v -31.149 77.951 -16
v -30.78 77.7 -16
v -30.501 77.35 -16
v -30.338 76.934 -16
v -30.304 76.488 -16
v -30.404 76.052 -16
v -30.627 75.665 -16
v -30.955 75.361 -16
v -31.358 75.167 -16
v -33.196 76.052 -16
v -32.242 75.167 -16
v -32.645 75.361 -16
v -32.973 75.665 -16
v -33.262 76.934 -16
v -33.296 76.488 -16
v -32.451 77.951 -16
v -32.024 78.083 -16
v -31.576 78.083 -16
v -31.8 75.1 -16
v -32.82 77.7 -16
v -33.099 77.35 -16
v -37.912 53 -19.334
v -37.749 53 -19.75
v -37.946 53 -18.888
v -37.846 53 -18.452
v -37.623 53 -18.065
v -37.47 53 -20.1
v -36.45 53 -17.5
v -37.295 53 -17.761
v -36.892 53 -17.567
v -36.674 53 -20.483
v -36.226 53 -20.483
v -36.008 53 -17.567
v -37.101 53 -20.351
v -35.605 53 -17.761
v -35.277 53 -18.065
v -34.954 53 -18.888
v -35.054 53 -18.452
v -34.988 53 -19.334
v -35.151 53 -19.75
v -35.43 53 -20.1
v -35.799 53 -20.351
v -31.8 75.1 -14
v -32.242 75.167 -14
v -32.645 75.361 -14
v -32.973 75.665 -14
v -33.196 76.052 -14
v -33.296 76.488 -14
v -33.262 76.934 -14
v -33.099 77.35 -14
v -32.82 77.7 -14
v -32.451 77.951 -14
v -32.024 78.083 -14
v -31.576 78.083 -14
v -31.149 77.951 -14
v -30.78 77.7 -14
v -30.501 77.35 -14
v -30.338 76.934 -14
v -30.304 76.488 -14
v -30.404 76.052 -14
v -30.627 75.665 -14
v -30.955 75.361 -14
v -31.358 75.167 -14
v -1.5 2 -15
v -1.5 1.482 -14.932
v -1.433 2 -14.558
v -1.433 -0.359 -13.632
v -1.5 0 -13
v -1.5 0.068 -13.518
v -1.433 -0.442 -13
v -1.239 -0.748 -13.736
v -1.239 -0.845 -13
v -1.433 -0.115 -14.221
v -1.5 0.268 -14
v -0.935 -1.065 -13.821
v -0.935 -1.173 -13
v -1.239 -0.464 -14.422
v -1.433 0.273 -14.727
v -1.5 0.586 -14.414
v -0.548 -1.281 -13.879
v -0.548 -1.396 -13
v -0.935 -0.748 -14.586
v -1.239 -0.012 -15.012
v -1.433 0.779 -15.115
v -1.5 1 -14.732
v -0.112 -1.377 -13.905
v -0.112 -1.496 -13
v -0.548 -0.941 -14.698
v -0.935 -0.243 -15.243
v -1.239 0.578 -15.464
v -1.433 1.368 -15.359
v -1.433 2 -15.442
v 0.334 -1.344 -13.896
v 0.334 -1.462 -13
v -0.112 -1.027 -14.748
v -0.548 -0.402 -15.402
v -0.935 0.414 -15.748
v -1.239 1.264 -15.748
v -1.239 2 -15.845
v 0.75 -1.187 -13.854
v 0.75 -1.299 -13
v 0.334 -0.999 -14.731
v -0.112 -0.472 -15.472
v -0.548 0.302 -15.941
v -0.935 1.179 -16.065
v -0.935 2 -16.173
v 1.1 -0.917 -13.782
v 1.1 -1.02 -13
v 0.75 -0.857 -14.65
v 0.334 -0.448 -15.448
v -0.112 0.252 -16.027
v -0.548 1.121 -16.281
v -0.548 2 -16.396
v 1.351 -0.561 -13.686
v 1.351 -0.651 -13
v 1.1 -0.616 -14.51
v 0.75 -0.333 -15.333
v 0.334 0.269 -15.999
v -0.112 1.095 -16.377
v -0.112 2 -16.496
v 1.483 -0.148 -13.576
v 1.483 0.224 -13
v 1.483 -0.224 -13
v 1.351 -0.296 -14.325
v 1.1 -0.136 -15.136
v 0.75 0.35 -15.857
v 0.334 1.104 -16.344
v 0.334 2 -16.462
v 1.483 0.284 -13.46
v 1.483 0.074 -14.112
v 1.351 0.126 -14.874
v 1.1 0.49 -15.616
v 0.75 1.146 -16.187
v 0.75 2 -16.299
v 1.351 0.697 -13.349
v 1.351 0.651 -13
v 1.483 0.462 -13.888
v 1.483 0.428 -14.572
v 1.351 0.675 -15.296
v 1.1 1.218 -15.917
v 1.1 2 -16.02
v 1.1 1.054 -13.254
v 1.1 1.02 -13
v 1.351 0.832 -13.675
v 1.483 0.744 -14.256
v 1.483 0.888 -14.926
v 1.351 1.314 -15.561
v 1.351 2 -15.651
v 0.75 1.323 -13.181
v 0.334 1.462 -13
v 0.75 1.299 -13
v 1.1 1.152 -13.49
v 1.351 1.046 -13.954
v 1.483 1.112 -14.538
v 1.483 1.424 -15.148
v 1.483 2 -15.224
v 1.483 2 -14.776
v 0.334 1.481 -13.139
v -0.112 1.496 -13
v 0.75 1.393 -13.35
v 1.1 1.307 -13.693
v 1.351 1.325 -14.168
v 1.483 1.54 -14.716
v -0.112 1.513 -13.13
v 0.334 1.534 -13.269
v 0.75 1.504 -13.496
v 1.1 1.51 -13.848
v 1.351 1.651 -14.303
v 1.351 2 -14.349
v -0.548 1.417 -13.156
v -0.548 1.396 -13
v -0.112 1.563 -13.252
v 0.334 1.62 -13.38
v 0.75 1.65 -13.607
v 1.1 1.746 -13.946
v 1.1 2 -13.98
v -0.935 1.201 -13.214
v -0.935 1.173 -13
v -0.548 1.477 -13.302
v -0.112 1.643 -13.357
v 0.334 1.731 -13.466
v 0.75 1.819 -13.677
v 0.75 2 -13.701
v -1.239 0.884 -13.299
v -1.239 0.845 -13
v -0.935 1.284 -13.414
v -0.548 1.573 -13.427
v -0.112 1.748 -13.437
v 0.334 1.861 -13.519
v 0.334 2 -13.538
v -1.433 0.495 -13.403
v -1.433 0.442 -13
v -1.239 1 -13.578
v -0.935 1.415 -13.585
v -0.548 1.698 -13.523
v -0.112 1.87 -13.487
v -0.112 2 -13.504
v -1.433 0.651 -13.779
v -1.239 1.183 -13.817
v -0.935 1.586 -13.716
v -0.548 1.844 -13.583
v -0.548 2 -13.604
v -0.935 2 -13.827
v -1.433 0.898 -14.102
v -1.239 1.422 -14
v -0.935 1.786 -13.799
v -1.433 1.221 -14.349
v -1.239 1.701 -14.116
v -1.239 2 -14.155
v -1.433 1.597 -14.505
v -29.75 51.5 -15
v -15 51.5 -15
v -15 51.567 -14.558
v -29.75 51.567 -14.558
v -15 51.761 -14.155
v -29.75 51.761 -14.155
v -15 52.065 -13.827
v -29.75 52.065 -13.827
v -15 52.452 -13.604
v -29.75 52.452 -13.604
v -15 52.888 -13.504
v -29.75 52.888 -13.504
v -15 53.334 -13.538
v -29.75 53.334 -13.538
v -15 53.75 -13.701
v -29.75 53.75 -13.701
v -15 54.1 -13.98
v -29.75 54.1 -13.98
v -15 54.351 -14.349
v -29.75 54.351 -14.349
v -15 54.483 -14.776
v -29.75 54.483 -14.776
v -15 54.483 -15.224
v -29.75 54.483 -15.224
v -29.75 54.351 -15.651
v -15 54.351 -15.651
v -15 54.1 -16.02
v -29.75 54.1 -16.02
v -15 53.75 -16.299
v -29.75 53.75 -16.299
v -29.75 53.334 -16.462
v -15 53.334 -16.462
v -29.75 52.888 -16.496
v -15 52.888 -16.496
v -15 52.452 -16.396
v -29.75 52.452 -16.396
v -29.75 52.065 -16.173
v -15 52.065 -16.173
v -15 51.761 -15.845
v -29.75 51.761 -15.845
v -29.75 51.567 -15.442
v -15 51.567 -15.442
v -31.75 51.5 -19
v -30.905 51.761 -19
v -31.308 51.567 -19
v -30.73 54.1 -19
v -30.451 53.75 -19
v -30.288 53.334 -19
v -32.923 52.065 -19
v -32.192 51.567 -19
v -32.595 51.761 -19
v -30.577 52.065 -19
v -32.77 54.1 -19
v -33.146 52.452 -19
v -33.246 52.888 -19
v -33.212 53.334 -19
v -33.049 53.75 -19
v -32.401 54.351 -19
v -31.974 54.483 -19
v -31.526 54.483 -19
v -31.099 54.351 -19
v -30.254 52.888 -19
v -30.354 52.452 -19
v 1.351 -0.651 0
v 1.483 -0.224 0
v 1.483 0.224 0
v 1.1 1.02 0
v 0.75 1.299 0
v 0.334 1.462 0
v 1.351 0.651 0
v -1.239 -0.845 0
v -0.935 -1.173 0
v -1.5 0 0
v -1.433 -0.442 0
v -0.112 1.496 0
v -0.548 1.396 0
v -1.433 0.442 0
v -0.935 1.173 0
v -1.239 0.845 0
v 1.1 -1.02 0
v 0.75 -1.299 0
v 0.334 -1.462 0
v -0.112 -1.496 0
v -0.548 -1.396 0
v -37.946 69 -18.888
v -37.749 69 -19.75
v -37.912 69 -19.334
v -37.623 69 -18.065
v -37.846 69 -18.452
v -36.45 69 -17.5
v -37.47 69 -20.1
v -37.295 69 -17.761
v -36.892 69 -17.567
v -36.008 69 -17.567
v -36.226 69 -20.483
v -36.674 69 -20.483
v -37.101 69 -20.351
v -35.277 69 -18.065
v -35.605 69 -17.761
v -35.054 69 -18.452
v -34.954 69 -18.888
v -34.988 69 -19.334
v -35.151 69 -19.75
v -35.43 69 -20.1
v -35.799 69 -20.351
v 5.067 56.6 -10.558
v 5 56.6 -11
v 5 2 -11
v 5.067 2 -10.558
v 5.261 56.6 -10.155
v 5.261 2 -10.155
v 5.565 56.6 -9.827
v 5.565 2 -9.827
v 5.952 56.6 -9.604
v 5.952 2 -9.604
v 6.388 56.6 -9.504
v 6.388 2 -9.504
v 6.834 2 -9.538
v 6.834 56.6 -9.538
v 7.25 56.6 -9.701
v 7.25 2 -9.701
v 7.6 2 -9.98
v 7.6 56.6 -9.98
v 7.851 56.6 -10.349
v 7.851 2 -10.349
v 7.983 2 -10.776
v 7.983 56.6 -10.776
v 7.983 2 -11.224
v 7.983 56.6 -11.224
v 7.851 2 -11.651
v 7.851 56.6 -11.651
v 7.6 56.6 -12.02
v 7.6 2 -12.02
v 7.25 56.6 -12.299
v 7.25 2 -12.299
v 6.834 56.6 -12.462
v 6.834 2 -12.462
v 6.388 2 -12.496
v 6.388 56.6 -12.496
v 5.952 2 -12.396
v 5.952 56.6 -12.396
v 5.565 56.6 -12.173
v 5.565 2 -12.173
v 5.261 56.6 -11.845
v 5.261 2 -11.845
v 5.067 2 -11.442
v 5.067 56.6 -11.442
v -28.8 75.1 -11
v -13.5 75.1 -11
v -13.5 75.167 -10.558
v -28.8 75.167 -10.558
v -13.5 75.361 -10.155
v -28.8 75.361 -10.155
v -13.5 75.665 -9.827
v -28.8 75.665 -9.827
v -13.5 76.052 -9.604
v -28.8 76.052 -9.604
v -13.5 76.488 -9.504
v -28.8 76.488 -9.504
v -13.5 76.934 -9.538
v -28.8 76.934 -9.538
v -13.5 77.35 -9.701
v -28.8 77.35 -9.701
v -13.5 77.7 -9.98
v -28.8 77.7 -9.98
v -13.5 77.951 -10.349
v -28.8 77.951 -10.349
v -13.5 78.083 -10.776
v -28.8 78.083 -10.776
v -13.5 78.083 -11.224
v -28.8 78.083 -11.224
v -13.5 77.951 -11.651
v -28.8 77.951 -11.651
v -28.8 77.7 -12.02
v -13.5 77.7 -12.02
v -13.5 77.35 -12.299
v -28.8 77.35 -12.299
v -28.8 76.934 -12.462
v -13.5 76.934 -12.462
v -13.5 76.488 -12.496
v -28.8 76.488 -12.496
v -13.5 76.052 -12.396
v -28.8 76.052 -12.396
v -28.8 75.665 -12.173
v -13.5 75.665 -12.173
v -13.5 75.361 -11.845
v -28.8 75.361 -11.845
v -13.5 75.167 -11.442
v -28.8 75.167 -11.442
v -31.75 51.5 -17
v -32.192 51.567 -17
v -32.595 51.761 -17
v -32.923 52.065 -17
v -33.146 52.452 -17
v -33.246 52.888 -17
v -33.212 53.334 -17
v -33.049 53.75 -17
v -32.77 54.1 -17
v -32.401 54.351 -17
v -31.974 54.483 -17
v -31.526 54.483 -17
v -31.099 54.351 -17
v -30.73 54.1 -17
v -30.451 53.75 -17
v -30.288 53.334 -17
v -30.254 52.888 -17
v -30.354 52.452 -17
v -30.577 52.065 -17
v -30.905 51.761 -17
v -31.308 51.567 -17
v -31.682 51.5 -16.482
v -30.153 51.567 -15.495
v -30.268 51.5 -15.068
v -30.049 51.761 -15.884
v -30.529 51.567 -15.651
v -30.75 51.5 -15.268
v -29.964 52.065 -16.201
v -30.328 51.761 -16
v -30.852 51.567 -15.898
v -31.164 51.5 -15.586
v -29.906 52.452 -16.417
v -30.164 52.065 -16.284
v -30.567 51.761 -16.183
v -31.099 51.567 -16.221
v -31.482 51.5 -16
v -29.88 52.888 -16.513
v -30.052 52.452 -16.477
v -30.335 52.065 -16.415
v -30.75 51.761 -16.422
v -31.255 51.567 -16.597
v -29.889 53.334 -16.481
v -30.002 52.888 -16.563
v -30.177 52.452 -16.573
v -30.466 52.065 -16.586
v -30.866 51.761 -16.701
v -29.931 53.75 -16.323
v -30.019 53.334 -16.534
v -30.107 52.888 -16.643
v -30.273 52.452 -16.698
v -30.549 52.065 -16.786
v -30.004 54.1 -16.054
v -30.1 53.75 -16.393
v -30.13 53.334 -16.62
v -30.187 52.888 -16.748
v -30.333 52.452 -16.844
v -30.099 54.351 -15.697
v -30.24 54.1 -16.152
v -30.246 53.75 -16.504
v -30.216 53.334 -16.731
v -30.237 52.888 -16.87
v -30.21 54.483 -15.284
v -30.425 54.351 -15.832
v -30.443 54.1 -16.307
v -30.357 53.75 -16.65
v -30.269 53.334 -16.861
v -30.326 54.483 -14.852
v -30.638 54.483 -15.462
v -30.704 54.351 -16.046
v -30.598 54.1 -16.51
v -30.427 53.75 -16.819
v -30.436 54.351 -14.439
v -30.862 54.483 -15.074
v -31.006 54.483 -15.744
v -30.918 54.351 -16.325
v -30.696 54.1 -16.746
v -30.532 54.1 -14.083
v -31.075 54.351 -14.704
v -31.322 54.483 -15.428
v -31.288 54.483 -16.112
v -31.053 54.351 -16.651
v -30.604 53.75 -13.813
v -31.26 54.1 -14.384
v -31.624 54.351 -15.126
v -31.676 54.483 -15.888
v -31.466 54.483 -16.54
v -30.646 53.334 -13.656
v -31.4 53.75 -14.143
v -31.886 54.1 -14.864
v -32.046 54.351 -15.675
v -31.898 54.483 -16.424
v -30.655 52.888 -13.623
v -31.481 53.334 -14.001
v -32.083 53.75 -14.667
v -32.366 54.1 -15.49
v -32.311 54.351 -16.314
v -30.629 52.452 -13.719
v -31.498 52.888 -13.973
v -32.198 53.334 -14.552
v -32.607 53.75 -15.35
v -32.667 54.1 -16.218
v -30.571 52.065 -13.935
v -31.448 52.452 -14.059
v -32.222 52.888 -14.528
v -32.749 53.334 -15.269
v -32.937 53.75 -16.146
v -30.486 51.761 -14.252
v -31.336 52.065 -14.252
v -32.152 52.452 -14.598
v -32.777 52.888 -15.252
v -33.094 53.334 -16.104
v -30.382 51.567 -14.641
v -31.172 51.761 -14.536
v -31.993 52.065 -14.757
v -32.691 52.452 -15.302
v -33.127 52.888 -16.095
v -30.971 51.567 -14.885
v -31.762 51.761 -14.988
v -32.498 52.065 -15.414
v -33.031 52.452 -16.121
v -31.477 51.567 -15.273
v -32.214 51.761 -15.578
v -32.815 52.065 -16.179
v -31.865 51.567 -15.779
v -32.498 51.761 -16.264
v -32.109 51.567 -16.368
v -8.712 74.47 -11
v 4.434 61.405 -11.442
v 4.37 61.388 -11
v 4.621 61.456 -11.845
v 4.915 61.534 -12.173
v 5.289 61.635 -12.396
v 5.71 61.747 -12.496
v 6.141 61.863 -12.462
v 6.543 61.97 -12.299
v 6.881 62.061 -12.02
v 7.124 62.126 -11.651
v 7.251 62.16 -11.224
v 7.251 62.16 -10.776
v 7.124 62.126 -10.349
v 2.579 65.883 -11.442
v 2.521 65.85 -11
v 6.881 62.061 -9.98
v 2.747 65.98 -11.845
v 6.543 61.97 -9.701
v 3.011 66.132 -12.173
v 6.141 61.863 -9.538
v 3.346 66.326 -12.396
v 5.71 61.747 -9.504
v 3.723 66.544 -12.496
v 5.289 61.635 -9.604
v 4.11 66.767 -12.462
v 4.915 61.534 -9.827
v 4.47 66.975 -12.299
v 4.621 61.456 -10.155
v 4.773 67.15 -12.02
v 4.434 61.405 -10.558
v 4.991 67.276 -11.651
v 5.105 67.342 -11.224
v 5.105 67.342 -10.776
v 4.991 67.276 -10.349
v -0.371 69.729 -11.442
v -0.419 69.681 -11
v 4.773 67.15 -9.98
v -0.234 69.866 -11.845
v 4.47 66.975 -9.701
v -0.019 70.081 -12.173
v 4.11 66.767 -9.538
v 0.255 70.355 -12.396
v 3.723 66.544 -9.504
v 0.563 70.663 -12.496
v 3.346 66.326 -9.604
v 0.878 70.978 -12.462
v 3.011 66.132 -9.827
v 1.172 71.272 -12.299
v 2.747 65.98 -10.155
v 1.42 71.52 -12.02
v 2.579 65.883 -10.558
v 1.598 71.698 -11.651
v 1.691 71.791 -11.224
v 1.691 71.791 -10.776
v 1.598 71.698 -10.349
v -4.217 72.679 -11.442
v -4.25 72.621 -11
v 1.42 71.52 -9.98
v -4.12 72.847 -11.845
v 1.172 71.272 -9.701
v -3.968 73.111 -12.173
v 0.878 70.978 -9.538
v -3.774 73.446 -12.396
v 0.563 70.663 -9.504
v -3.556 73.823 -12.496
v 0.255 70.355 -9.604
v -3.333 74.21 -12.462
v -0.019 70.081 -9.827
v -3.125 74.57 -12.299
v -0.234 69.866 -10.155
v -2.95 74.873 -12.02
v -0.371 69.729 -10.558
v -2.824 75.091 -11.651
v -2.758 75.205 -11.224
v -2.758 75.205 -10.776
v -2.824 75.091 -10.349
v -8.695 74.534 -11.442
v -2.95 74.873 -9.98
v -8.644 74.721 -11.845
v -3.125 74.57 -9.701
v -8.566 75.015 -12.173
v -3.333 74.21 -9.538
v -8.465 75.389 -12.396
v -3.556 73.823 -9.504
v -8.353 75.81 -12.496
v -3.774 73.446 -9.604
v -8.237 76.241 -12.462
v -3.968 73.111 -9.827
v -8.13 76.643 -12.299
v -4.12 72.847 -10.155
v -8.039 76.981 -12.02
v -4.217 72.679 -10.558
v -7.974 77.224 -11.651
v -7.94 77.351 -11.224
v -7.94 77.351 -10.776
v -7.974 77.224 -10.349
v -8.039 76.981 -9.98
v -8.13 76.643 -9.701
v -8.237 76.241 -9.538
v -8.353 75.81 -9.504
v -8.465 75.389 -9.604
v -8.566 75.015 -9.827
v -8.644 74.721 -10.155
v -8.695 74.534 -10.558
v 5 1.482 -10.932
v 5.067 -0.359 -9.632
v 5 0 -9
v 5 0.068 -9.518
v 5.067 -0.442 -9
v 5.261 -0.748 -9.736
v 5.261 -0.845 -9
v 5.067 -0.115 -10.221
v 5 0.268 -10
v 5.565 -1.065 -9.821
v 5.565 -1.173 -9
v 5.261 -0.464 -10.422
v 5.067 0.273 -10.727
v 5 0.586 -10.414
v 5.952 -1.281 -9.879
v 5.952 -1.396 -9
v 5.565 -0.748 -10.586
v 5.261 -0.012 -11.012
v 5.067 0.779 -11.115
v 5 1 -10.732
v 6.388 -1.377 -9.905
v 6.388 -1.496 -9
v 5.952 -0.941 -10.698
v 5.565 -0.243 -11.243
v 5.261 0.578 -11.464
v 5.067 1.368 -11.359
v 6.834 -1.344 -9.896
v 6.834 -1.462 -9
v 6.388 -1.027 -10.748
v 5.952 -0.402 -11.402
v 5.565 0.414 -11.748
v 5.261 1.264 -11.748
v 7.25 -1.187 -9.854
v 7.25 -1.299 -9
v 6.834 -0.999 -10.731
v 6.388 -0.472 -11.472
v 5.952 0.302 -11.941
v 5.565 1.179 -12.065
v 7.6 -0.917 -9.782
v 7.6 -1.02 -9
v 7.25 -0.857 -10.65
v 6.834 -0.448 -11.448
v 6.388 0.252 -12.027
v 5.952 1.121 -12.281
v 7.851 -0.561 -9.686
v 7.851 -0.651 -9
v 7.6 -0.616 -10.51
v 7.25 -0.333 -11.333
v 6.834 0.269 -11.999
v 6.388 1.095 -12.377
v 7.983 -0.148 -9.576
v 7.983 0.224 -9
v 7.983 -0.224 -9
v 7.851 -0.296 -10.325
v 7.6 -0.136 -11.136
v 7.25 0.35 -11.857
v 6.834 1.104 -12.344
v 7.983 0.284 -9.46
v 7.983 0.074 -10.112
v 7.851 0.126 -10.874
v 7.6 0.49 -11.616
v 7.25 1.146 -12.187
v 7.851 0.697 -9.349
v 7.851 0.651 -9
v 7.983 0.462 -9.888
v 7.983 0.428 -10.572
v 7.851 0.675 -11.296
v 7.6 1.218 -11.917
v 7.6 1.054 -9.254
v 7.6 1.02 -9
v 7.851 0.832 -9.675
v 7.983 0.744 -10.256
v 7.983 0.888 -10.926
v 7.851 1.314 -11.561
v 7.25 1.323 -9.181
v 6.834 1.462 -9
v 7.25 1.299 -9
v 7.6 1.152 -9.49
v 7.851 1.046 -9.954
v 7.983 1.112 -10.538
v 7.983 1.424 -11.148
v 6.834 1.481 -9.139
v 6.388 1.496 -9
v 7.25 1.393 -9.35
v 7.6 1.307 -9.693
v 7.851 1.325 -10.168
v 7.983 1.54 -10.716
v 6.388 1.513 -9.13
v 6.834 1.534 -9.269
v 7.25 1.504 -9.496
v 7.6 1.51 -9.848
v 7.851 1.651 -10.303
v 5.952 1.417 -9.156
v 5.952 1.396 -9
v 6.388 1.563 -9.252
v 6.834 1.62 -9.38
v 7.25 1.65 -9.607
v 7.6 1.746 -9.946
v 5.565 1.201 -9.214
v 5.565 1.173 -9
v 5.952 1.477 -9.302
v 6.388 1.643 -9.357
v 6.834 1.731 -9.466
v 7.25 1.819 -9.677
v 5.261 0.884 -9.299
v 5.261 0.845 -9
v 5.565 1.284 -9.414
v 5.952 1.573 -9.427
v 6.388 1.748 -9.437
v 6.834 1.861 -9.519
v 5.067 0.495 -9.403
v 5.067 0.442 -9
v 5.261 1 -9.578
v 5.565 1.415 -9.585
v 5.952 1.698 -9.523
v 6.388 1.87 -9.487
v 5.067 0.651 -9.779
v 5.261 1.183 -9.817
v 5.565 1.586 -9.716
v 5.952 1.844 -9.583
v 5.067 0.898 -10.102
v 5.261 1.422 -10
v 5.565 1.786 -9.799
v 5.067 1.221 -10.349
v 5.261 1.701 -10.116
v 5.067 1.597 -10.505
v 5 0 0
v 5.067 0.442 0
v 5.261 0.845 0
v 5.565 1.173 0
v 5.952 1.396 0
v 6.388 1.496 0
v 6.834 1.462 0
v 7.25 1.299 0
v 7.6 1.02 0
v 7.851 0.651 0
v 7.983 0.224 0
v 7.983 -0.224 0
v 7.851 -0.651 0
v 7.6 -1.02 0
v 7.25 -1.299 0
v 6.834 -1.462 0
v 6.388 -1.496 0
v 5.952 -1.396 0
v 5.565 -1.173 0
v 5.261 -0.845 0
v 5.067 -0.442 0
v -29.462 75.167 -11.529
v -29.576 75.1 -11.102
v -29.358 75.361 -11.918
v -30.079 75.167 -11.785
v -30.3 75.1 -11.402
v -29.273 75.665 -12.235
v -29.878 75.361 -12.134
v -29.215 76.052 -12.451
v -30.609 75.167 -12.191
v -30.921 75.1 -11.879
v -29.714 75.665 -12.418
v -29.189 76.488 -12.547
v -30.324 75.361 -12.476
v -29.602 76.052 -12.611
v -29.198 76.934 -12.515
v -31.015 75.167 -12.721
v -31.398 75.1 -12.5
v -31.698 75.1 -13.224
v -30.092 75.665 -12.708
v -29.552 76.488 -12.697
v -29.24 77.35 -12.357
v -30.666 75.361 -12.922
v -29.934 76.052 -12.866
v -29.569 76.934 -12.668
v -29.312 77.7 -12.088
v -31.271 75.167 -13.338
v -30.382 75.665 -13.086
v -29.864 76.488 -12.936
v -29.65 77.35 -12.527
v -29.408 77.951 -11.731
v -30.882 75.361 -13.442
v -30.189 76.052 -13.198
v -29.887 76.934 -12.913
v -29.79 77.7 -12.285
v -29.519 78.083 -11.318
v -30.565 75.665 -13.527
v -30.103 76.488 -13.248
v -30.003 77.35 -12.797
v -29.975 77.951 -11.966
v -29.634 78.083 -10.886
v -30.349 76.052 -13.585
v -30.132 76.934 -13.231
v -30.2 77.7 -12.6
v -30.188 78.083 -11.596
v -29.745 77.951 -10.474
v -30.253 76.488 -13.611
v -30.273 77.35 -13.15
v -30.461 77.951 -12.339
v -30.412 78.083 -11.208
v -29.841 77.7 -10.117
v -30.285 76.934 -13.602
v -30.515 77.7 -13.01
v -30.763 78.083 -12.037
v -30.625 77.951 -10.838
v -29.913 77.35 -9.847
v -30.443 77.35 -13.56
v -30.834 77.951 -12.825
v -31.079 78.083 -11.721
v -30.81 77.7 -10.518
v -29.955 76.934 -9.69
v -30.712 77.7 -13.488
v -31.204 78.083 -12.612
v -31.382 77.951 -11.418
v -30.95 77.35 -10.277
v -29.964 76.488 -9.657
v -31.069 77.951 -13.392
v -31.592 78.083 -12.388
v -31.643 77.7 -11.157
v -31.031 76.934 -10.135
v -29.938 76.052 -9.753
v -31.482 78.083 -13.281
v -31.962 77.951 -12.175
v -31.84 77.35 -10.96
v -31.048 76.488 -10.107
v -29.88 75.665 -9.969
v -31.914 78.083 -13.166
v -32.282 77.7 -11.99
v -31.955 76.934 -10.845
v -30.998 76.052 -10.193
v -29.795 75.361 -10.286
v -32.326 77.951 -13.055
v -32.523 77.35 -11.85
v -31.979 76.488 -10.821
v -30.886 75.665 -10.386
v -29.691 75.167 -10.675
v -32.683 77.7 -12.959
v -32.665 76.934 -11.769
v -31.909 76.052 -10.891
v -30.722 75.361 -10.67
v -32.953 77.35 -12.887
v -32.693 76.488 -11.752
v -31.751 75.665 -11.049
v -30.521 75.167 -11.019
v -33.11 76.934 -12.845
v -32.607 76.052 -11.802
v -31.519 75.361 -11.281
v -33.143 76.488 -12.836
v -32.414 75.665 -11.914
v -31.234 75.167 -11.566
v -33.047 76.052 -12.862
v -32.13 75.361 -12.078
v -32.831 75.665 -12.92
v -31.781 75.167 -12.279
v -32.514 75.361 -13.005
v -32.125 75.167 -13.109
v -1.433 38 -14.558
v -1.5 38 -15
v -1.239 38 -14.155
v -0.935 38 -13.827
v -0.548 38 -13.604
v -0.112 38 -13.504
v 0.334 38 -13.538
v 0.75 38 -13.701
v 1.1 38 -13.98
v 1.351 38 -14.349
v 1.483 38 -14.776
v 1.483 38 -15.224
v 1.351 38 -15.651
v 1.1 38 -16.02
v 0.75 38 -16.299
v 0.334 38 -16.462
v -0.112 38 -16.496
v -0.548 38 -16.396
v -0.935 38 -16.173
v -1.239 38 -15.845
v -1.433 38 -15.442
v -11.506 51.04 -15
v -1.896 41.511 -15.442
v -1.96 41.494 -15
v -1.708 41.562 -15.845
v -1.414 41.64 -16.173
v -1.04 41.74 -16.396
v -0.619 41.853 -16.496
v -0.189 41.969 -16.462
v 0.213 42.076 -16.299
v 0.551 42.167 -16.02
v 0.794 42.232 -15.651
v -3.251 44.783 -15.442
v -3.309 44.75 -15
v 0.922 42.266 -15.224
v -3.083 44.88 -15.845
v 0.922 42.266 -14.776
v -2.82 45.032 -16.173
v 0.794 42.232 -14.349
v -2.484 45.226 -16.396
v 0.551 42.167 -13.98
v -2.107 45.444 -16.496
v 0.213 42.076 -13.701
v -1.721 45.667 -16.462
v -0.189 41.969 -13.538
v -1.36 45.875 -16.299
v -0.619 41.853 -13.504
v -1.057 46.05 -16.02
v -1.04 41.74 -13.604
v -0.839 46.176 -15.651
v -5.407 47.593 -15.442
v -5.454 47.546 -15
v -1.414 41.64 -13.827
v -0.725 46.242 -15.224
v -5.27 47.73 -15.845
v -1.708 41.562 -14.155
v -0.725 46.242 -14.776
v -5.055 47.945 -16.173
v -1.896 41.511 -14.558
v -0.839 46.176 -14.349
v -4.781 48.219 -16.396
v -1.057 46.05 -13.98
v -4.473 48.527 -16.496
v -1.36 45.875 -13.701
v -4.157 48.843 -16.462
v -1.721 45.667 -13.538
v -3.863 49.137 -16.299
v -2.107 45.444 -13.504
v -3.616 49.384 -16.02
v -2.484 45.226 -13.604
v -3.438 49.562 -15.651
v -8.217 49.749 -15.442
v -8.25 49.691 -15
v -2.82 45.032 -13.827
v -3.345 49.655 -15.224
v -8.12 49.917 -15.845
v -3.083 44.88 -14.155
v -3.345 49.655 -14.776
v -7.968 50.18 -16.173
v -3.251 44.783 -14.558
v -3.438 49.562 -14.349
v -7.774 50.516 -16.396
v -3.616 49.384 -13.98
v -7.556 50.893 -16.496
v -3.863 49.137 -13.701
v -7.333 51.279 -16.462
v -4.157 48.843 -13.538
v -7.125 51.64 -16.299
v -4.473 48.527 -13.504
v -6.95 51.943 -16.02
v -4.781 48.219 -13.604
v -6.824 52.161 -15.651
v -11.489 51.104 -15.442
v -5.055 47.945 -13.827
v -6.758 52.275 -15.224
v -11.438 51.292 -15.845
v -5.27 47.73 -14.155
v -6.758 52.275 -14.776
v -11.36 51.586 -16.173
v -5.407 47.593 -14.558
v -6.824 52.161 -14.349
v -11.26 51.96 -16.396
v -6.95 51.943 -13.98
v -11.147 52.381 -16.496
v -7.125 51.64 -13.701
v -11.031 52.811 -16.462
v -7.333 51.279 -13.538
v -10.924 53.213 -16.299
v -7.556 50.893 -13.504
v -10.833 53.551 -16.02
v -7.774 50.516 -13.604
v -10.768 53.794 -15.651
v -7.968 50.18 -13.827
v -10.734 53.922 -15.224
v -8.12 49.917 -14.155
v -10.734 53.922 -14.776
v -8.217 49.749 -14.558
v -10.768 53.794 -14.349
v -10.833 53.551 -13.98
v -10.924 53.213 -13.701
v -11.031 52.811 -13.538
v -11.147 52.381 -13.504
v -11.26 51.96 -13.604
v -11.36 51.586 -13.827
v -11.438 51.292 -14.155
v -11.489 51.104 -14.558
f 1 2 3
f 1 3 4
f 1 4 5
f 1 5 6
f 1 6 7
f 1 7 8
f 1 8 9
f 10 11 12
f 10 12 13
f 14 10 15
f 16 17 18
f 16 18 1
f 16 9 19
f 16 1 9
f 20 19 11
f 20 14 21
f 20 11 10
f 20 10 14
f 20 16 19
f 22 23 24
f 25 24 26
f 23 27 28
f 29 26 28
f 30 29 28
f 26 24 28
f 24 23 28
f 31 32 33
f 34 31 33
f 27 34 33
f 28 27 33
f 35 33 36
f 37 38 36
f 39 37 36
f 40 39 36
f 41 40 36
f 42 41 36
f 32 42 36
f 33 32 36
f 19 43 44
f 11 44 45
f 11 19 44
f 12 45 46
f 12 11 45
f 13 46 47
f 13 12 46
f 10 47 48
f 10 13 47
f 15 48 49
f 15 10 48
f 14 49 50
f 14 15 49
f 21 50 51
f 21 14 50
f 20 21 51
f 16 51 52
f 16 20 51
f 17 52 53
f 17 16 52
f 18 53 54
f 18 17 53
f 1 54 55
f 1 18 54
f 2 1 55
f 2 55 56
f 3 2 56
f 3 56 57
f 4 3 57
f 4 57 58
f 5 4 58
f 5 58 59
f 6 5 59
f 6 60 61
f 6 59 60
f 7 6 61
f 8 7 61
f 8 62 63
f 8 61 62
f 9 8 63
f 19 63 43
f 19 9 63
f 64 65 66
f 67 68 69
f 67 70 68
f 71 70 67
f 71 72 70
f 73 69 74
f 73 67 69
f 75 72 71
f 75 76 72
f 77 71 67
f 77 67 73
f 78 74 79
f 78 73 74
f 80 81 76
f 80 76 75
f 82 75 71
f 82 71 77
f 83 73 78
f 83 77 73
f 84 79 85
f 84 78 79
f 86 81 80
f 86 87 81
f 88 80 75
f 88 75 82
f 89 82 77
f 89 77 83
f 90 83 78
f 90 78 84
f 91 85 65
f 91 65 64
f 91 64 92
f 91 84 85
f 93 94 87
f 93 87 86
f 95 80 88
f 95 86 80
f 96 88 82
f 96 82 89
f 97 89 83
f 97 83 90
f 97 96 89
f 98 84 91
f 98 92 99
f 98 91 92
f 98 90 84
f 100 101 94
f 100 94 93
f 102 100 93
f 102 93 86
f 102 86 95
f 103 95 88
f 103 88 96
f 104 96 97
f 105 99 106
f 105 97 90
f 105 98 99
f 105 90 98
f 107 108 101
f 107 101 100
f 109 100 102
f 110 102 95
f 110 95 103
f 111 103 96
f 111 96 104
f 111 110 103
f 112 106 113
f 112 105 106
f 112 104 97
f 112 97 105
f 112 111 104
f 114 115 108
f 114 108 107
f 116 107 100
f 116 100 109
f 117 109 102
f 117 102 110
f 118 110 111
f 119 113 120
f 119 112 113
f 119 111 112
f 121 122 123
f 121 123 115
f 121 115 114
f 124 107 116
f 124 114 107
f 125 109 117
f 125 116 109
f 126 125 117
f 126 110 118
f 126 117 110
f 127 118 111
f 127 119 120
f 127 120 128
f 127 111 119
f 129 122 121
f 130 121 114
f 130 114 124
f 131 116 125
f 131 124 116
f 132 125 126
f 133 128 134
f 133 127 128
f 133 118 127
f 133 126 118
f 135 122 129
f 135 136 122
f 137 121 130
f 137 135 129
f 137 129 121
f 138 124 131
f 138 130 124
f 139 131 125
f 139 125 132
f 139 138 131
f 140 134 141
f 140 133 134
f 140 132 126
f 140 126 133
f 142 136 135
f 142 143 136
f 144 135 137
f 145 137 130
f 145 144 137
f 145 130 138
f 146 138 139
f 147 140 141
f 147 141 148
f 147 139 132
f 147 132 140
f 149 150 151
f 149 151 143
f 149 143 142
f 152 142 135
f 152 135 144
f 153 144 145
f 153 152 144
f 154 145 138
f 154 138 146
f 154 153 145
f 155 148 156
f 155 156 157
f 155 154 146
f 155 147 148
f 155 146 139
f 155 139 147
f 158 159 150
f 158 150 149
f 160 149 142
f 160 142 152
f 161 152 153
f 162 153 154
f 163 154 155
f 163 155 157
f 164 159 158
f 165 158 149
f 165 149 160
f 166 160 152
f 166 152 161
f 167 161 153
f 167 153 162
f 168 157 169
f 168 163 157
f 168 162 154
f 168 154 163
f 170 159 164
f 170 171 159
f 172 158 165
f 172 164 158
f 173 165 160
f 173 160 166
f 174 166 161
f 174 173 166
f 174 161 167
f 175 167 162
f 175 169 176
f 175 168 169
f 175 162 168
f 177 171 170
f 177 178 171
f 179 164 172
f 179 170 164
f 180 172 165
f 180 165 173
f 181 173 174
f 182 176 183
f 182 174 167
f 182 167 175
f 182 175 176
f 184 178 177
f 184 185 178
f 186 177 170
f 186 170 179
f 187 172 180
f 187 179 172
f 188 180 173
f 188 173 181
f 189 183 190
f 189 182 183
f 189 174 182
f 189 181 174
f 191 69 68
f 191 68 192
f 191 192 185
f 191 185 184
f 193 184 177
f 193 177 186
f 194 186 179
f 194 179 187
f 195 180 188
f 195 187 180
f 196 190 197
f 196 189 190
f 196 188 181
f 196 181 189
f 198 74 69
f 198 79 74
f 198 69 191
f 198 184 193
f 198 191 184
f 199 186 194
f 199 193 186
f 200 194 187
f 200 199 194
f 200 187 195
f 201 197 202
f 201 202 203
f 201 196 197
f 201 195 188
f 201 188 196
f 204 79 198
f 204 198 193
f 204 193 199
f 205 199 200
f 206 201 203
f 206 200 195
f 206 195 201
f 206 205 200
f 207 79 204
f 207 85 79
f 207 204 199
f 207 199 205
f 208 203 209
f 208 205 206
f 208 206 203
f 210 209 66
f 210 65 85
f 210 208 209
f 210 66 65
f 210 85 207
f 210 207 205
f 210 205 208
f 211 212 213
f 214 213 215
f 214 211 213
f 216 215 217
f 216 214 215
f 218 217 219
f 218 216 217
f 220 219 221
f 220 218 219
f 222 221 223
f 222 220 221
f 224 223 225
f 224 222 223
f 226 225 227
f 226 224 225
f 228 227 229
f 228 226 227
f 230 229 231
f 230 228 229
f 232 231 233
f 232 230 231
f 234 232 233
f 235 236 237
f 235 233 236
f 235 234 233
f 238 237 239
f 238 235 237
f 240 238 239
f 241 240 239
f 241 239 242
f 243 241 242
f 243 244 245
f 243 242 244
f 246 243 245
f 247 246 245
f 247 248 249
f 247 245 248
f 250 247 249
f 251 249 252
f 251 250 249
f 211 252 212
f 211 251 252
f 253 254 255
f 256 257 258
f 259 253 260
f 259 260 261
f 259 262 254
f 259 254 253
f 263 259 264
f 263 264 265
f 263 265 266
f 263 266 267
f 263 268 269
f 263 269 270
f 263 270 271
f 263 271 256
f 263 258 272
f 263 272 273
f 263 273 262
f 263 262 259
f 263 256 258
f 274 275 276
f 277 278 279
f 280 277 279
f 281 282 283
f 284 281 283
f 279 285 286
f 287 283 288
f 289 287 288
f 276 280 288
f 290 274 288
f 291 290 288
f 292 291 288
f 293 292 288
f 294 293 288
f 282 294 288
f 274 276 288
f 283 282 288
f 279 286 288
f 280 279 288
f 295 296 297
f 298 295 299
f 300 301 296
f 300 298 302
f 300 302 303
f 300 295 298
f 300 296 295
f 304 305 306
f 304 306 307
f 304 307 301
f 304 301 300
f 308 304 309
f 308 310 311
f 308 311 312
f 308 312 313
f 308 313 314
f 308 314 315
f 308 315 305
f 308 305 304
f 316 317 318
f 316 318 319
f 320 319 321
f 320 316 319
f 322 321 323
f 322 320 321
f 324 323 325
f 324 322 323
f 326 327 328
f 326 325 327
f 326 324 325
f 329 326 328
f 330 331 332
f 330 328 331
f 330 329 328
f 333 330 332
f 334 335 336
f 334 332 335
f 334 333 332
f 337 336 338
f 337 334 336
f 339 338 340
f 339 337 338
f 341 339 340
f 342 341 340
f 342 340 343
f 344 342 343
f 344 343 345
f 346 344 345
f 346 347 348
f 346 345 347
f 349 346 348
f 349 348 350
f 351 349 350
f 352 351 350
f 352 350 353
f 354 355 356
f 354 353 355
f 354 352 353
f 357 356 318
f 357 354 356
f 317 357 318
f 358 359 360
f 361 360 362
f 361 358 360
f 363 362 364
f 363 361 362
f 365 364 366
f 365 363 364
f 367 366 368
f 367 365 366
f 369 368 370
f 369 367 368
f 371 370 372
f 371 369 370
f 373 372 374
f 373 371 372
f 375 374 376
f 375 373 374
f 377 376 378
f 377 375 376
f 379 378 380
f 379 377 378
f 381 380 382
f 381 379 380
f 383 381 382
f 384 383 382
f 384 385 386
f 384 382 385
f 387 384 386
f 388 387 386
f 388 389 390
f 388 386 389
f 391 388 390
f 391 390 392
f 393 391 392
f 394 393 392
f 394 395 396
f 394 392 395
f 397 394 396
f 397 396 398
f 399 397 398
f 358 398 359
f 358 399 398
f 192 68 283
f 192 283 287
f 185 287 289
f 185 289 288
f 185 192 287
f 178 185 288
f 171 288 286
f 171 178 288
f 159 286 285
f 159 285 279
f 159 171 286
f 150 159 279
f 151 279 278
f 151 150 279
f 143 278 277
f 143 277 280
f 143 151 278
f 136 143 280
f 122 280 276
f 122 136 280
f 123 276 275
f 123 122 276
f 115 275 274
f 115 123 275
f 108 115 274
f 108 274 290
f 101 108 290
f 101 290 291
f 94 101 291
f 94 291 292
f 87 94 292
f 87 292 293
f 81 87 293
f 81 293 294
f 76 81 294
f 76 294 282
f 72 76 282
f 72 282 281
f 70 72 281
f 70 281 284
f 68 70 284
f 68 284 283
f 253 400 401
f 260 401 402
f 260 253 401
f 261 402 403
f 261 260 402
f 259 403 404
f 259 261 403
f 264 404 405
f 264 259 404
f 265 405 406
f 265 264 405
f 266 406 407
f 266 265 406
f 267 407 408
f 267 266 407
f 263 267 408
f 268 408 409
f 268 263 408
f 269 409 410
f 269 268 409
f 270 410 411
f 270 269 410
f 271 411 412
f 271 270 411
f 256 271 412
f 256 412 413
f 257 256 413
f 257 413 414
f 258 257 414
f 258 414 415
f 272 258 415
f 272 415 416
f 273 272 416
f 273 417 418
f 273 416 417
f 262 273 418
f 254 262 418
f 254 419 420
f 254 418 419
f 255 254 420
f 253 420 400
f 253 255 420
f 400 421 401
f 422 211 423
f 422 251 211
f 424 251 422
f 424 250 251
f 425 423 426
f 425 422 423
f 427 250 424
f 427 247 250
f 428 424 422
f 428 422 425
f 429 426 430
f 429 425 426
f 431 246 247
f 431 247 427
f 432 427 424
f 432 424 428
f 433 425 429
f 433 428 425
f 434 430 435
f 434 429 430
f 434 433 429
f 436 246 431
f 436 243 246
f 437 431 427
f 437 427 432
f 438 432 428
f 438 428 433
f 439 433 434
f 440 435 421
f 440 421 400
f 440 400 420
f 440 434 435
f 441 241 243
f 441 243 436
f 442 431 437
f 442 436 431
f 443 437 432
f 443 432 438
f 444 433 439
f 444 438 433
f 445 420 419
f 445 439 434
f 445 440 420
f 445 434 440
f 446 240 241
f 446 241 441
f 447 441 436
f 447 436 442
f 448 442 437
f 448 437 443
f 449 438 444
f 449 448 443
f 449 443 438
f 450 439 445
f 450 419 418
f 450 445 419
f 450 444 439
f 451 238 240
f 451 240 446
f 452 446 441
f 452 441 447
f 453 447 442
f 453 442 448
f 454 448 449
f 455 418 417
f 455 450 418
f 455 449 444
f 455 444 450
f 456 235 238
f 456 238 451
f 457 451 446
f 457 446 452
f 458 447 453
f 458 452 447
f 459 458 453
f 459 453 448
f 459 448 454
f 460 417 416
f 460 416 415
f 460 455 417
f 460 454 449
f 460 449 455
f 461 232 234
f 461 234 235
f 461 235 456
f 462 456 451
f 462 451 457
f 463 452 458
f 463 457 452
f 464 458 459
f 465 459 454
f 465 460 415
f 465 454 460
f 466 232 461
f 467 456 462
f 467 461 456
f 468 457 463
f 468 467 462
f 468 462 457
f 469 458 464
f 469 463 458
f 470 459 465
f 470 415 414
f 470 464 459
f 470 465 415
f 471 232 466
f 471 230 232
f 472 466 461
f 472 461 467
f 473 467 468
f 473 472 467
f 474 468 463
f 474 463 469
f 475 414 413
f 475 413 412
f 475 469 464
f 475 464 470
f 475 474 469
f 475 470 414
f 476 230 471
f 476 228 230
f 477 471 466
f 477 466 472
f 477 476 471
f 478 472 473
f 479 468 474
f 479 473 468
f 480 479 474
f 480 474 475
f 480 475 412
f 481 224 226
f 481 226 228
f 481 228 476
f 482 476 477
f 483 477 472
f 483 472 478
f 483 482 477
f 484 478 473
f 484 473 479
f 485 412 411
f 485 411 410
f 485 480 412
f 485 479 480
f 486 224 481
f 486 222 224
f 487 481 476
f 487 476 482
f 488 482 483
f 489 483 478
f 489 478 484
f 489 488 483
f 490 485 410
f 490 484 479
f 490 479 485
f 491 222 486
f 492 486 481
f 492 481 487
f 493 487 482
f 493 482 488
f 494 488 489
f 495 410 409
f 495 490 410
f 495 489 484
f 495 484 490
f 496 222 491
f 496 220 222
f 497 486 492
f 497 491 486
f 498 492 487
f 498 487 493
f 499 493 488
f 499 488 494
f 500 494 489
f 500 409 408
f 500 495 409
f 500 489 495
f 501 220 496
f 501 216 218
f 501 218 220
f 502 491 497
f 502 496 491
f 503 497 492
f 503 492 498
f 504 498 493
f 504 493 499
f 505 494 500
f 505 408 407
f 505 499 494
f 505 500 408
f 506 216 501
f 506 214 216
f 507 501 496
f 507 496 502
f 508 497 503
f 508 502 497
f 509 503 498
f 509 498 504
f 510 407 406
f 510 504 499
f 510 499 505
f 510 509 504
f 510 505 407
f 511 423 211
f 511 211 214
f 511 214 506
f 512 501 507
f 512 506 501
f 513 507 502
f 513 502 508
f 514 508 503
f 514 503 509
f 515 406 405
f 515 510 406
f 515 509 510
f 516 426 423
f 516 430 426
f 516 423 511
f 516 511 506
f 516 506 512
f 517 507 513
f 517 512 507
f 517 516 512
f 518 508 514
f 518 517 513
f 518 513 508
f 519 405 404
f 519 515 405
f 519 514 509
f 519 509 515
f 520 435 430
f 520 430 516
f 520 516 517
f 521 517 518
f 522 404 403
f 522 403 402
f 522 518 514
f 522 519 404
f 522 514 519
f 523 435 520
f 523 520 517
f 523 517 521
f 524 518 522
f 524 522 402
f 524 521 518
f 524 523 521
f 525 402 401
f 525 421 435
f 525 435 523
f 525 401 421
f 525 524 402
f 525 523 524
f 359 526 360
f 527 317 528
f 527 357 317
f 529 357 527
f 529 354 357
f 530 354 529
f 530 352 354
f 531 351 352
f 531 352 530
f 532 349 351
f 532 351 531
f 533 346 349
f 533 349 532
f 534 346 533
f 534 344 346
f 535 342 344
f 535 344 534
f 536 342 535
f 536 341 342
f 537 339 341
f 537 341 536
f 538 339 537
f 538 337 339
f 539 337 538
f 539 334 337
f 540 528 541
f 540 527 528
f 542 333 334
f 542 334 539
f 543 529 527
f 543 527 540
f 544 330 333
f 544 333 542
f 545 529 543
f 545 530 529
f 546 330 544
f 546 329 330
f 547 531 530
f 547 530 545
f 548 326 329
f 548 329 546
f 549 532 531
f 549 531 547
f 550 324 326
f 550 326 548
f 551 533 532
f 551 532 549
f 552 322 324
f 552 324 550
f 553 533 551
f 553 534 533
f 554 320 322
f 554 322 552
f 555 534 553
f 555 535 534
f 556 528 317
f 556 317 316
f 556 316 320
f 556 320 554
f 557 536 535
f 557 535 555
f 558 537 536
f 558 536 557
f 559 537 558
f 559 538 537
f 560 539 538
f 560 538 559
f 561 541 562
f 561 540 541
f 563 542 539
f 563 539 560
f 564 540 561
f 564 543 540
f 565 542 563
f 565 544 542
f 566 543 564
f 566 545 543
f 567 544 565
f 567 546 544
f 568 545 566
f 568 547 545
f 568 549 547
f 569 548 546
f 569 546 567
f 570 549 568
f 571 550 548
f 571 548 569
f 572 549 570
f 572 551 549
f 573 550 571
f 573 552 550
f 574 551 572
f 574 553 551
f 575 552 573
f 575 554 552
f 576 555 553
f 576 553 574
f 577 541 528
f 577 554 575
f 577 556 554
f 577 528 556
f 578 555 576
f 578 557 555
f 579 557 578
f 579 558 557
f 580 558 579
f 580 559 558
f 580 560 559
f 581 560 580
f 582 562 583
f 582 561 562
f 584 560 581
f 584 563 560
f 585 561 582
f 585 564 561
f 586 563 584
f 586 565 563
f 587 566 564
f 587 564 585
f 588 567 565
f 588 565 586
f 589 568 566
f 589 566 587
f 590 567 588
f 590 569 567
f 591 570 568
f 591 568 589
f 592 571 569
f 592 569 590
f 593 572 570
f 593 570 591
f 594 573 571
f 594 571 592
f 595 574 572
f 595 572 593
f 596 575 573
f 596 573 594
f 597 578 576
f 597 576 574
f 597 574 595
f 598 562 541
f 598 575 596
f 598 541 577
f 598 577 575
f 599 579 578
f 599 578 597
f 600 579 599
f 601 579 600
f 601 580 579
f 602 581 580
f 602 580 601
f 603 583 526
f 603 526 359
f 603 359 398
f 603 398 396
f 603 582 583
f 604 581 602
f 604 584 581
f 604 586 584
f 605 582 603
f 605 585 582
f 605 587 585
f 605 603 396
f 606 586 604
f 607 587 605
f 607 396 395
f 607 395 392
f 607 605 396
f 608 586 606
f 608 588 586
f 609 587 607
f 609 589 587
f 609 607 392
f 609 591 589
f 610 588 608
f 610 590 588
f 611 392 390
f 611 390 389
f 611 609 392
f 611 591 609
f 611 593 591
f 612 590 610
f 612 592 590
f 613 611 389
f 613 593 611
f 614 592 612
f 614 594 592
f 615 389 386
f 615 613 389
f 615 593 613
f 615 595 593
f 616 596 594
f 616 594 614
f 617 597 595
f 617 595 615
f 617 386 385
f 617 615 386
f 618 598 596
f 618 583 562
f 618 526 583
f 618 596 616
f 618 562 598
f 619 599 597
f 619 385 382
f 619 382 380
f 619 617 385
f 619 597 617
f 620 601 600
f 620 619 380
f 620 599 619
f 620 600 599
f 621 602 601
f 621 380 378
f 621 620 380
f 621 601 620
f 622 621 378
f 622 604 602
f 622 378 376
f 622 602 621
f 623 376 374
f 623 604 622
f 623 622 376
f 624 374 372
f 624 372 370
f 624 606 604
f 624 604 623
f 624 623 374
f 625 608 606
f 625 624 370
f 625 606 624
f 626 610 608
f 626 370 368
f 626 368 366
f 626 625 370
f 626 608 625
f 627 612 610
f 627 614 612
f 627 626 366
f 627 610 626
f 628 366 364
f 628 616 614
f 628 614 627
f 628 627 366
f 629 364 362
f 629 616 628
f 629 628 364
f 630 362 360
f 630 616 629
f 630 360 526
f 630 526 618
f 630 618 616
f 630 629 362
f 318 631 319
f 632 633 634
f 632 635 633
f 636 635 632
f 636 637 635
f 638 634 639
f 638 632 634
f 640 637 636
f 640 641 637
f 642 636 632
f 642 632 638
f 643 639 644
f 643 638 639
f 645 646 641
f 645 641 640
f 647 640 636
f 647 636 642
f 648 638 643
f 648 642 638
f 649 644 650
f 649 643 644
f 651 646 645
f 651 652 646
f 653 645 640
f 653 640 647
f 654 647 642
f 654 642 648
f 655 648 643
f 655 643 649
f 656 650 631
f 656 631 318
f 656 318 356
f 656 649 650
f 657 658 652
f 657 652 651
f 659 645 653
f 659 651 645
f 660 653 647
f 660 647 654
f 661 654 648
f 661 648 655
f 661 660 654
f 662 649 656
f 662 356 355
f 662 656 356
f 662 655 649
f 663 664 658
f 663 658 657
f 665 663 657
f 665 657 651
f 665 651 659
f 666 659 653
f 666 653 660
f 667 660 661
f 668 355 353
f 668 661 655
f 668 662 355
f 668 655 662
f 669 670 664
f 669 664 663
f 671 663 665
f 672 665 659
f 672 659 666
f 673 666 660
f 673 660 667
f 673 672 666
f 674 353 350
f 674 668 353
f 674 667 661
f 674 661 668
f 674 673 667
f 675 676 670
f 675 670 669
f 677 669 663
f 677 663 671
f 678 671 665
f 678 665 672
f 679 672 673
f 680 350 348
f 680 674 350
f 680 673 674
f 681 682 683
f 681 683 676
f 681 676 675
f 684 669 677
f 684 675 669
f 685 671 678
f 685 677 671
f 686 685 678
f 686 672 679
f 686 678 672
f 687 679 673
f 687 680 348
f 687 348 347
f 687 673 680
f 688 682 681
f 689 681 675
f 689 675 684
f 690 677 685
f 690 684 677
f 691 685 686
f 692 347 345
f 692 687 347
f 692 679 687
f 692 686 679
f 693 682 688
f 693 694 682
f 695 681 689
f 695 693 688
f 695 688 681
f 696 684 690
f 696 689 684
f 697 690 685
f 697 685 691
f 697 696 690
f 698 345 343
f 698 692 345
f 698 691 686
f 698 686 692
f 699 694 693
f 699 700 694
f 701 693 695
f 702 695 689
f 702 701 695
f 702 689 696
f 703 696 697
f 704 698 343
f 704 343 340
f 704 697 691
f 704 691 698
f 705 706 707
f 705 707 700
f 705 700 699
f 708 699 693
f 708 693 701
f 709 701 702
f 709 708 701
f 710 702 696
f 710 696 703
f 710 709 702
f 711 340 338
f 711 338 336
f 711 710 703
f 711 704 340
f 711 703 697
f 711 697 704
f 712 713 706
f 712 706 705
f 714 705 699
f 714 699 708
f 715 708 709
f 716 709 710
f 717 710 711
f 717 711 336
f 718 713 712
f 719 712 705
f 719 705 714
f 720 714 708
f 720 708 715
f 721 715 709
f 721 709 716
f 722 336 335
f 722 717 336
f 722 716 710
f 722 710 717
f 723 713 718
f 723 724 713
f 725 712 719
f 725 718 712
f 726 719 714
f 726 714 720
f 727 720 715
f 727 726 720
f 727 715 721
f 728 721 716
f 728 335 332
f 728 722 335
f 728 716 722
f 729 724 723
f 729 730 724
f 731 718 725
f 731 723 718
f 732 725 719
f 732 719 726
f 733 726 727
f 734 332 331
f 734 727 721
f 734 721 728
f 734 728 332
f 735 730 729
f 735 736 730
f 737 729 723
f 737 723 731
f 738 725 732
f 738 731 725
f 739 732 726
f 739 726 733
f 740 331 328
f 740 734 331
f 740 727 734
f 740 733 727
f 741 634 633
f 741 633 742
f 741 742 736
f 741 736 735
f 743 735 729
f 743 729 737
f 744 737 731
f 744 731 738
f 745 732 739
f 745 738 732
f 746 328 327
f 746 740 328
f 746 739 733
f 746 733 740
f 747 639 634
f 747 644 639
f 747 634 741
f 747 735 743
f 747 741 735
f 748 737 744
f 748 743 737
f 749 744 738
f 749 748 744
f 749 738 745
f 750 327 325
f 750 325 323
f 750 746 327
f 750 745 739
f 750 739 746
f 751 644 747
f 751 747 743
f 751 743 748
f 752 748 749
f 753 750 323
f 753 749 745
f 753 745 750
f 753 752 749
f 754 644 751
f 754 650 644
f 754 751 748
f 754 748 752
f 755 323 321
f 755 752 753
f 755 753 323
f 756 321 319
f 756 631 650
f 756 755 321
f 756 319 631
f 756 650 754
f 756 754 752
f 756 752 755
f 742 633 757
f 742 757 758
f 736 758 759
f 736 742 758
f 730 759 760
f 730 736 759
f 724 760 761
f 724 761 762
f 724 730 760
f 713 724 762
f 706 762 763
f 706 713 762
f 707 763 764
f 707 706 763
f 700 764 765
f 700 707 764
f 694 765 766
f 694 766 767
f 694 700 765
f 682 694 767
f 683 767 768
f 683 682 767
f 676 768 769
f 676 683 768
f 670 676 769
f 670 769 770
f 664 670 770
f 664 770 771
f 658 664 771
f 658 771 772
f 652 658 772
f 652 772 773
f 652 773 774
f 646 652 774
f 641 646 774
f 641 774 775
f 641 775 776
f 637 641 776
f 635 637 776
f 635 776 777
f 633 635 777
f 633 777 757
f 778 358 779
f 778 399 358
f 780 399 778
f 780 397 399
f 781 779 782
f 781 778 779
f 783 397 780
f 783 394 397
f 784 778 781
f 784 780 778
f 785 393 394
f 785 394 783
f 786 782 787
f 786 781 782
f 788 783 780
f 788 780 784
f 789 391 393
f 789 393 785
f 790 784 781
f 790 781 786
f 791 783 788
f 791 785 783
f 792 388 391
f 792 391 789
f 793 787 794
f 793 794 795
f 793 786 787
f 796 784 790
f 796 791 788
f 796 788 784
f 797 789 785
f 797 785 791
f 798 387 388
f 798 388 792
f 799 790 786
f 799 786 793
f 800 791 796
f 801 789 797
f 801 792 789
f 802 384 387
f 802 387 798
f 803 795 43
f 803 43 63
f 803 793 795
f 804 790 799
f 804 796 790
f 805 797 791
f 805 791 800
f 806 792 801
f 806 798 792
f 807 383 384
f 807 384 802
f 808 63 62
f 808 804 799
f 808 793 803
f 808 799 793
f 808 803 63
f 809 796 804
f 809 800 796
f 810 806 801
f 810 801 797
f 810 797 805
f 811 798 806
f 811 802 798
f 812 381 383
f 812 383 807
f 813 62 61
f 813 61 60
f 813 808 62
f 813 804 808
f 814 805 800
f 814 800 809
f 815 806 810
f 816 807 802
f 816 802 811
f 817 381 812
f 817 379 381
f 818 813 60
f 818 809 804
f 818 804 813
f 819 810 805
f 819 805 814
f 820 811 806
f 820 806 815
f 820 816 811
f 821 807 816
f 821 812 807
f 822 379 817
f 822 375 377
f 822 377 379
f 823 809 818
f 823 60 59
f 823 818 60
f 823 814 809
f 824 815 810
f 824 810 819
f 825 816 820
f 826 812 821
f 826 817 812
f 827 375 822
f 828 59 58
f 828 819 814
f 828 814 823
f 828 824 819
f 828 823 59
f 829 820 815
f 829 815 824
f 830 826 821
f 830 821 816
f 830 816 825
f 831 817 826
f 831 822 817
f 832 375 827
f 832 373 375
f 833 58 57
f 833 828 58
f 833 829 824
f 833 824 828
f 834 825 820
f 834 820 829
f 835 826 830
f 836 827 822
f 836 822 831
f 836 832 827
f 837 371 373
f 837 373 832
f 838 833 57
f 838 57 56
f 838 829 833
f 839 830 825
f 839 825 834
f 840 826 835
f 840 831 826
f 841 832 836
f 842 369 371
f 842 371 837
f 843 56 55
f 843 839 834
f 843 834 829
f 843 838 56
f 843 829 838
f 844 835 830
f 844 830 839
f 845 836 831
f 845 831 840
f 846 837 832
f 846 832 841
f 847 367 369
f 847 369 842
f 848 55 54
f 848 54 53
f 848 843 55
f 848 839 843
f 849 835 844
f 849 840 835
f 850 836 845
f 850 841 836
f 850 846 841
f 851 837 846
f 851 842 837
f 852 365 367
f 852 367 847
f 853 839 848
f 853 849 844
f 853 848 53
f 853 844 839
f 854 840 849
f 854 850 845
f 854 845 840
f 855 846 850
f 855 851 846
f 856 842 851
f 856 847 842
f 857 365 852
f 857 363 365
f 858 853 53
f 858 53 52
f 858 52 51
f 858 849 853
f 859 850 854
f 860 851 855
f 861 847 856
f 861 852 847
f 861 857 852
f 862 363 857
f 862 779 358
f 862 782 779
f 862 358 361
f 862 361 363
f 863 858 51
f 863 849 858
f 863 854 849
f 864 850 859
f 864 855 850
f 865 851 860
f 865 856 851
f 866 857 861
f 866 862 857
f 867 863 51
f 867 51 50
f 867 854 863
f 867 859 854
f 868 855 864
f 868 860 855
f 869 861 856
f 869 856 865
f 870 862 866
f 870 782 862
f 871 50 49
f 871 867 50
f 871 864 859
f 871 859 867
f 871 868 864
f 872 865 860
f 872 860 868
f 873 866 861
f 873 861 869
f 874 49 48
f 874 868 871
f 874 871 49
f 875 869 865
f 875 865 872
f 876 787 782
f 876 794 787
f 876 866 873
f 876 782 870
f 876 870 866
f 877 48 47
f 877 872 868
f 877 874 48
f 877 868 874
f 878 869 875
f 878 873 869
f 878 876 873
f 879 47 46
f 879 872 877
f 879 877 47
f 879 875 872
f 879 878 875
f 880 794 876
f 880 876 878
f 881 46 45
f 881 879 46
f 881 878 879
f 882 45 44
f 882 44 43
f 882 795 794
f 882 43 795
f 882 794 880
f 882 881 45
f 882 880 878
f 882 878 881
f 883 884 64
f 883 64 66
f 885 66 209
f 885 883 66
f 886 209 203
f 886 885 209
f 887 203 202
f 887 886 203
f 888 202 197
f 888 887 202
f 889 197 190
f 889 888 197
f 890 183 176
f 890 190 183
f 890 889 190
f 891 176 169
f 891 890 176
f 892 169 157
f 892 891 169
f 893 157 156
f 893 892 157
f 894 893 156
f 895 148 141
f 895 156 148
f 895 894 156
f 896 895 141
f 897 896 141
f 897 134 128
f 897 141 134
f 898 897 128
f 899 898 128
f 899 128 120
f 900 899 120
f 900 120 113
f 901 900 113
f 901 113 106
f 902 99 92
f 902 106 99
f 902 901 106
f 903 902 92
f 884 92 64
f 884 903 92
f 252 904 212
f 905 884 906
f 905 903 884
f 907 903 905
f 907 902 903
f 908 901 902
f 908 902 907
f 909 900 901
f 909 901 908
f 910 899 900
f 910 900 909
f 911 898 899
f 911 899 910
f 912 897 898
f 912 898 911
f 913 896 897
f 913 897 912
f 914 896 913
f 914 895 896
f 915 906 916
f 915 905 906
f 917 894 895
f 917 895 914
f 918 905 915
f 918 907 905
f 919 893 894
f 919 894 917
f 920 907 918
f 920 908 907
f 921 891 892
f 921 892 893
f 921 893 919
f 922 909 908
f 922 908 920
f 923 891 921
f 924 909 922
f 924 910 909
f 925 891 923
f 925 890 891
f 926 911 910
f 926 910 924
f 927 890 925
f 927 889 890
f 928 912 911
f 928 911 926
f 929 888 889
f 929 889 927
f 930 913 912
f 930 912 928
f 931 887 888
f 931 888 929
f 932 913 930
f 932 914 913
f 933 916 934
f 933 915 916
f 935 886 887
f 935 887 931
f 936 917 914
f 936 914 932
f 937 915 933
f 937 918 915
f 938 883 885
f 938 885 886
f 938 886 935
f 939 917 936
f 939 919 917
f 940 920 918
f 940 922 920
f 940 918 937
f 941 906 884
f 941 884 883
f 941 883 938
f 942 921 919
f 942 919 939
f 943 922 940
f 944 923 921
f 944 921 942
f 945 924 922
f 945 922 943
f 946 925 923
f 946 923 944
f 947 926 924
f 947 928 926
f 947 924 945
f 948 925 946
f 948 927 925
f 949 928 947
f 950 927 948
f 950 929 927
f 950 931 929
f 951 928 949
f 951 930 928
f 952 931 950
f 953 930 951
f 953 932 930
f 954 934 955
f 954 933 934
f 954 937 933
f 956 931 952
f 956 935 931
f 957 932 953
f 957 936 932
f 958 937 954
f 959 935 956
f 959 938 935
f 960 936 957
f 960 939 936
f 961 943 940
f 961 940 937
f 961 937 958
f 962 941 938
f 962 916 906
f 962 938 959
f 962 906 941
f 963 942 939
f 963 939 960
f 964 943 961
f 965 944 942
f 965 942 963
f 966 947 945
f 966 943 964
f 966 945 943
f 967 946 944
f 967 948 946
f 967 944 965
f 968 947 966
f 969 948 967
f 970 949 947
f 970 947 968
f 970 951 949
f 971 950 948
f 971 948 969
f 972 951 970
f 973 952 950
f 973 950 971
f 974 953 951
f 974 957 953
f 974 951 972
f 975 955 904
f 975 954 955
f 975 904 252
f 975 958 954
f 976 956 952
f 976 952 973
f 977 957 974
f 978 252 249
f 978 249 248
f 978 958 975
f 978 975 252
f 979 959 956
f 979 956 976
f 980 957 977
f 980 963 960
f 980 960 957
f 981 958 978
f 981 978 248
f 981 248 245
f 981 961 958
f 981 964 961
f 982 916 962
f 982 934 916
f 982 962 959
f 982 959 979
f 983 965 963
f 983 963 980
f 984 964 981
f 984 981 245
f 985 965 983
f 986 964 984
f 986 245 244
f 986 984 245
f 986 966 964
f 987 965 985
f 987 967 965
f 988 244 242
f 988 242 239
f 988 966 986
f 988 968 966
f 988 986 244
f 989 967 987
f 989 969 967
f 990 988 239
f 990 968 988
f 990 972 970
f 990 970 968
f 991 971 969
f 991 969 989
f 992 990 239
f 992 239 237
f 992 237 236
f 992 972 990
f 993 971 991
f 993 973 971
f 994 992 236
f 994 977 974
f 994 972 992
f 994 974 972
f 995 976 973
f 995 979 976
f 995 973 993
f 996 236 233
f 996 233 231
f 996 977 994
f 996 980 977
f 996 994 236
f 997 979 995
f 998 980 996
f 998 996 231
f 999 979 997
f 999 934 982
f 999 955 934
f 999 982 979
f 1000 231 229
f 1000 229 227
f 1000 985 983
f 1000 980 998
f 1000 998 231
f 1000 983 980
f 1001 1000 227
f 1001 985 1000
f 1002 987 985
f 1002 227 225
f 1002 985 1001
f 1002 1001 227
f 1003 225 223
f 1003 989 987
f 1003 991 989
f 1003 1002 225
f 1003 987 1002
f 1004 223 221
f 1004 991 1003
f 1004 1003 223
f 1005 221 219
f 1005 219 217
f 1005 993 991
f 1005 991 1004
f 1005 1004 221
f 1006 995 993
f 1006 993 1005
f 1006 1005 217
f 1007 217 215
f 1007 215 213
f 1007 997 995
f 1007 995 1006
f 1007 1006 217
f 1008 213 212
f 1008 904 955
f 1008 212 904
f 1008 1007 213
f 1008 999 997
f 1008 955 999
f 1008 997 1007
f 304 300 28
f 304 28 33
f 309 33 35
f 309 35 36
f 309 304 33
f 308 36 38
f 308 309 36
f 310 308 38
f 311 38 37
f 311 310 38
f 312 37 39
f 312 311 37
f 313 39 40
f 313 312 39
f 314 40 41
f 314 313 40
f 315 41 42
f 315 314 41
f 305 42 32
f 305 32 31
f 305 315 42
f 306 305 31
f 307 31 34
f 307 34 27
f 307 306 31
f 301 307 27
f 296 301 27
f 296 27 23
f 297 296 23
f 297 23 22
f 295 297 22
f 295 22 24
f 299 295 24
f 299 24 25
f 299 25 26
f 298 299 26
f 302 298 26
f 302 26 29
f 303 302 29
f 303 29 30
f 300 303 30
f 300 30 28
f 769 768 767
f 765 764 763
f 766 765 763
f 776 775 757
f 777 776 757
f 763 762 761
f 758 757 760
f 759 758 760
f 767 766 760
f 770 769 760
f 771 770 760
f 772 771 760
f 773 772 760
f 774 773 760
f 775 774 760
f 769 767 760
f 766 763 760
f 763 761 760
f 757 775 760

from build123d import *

# Parameters (mm, degrees)
SWEEP1_PROFILE_R = 1.5
SWEEP2_PROFILE_R = 1.5
SWEEP3_PROFILE_R = 1.5


with BuildPart() as part:
    # Sweep1: sweep along a curve in space
    with BuildLine() as sweep1_path:
        Line((0, 0, 0), (0, 0, -13))
        ThreePointArc((0, 0, -13), (0, 0.585786438, -14.414213562), (0, 2, -15))
        Line((0, 2, -15), (0, 38, -15))
        ThreePointArc((-15, 53, -15), (-4.393398282, 48.606601718, -15), (0, 38, -15))
        Line((-15, 53, -15), (-29.75, 53, -15))
        ThreePointArc((-29.75, 53, -15), (-31.164213562, 53, -15.585786438), (-31.75, 53, -17))
        Line((-31.75, 53, -17), (-31.75, 53, -19))
    # Sweep1 profile (on start of the path) → Sweep1 (sweep)
    with BuildSketch(Plane(origin=(0, 0, 0), x_dir=(-1, 0, 0), z_dir=(0, 0, -1))):
        Circle(SWEEP1_PROFILE_R)
    sweep(path=sweep1_path.line)


with BuildPart() as body_2:
    # Sweep2: sweep along a curve in space
    with BuildLine() as sweep2_path:
        Line((-36.45, 53, -19), (-36.45, 69, -19))
    # Sweep2 profile (on start of the path) → Sweep2 (sweep)
    with BuildSketch(Plane(origin=(-36.45, 53, -19), x_dir=(0, 0, 1), z_dir=(0, 1, 0))):
        Circle(SWEEP2_PROFILE_R)
    sweep(path=sweep2_path.line)


with BuildPart() as body_3:
    # Sweep3: sweep along a curve in space
    with BuildLine() as sweep3_path:
        Line((6.5, 0, 0), (6.5, 0, -9))
        ThreePointArc((6.5, 0, -9), (6.5, 0.585786438, -10.414213562), (6.5, 2, -11))
        Line((6.5, 2, -11), (6.5, 56.6, -11))
        ThreePointArc((6.5, 56.6, -11), (0.642135624, 70.742135624, -11), (-13.5, 76.6, -11))
        Line((-13.5, 76.6, -11), (-28.8, 76.6, -11))
        ThreePointArc((-28.8, 76.6, -11), (-30.921320344, 76.6, -11.878679656), (-31.8, 76.6, -14))
        Line((-31.8, 76.6, -14), (-31.8, 76.6, -16))
    # Sweep3 profile (on start of the path) → Sweep3 (sweep)
    with BuildSketch(Plane(origin=(6.5, 0, 0), x_dir=(-1, 0, 0), z_dir=(0, 0, -1))):
        Circle(SWEEP3_PROFILE_R)
    sweep(path=sweep3_path.line)


solid = Compound([part.part, body_2.part, body_3.part])
